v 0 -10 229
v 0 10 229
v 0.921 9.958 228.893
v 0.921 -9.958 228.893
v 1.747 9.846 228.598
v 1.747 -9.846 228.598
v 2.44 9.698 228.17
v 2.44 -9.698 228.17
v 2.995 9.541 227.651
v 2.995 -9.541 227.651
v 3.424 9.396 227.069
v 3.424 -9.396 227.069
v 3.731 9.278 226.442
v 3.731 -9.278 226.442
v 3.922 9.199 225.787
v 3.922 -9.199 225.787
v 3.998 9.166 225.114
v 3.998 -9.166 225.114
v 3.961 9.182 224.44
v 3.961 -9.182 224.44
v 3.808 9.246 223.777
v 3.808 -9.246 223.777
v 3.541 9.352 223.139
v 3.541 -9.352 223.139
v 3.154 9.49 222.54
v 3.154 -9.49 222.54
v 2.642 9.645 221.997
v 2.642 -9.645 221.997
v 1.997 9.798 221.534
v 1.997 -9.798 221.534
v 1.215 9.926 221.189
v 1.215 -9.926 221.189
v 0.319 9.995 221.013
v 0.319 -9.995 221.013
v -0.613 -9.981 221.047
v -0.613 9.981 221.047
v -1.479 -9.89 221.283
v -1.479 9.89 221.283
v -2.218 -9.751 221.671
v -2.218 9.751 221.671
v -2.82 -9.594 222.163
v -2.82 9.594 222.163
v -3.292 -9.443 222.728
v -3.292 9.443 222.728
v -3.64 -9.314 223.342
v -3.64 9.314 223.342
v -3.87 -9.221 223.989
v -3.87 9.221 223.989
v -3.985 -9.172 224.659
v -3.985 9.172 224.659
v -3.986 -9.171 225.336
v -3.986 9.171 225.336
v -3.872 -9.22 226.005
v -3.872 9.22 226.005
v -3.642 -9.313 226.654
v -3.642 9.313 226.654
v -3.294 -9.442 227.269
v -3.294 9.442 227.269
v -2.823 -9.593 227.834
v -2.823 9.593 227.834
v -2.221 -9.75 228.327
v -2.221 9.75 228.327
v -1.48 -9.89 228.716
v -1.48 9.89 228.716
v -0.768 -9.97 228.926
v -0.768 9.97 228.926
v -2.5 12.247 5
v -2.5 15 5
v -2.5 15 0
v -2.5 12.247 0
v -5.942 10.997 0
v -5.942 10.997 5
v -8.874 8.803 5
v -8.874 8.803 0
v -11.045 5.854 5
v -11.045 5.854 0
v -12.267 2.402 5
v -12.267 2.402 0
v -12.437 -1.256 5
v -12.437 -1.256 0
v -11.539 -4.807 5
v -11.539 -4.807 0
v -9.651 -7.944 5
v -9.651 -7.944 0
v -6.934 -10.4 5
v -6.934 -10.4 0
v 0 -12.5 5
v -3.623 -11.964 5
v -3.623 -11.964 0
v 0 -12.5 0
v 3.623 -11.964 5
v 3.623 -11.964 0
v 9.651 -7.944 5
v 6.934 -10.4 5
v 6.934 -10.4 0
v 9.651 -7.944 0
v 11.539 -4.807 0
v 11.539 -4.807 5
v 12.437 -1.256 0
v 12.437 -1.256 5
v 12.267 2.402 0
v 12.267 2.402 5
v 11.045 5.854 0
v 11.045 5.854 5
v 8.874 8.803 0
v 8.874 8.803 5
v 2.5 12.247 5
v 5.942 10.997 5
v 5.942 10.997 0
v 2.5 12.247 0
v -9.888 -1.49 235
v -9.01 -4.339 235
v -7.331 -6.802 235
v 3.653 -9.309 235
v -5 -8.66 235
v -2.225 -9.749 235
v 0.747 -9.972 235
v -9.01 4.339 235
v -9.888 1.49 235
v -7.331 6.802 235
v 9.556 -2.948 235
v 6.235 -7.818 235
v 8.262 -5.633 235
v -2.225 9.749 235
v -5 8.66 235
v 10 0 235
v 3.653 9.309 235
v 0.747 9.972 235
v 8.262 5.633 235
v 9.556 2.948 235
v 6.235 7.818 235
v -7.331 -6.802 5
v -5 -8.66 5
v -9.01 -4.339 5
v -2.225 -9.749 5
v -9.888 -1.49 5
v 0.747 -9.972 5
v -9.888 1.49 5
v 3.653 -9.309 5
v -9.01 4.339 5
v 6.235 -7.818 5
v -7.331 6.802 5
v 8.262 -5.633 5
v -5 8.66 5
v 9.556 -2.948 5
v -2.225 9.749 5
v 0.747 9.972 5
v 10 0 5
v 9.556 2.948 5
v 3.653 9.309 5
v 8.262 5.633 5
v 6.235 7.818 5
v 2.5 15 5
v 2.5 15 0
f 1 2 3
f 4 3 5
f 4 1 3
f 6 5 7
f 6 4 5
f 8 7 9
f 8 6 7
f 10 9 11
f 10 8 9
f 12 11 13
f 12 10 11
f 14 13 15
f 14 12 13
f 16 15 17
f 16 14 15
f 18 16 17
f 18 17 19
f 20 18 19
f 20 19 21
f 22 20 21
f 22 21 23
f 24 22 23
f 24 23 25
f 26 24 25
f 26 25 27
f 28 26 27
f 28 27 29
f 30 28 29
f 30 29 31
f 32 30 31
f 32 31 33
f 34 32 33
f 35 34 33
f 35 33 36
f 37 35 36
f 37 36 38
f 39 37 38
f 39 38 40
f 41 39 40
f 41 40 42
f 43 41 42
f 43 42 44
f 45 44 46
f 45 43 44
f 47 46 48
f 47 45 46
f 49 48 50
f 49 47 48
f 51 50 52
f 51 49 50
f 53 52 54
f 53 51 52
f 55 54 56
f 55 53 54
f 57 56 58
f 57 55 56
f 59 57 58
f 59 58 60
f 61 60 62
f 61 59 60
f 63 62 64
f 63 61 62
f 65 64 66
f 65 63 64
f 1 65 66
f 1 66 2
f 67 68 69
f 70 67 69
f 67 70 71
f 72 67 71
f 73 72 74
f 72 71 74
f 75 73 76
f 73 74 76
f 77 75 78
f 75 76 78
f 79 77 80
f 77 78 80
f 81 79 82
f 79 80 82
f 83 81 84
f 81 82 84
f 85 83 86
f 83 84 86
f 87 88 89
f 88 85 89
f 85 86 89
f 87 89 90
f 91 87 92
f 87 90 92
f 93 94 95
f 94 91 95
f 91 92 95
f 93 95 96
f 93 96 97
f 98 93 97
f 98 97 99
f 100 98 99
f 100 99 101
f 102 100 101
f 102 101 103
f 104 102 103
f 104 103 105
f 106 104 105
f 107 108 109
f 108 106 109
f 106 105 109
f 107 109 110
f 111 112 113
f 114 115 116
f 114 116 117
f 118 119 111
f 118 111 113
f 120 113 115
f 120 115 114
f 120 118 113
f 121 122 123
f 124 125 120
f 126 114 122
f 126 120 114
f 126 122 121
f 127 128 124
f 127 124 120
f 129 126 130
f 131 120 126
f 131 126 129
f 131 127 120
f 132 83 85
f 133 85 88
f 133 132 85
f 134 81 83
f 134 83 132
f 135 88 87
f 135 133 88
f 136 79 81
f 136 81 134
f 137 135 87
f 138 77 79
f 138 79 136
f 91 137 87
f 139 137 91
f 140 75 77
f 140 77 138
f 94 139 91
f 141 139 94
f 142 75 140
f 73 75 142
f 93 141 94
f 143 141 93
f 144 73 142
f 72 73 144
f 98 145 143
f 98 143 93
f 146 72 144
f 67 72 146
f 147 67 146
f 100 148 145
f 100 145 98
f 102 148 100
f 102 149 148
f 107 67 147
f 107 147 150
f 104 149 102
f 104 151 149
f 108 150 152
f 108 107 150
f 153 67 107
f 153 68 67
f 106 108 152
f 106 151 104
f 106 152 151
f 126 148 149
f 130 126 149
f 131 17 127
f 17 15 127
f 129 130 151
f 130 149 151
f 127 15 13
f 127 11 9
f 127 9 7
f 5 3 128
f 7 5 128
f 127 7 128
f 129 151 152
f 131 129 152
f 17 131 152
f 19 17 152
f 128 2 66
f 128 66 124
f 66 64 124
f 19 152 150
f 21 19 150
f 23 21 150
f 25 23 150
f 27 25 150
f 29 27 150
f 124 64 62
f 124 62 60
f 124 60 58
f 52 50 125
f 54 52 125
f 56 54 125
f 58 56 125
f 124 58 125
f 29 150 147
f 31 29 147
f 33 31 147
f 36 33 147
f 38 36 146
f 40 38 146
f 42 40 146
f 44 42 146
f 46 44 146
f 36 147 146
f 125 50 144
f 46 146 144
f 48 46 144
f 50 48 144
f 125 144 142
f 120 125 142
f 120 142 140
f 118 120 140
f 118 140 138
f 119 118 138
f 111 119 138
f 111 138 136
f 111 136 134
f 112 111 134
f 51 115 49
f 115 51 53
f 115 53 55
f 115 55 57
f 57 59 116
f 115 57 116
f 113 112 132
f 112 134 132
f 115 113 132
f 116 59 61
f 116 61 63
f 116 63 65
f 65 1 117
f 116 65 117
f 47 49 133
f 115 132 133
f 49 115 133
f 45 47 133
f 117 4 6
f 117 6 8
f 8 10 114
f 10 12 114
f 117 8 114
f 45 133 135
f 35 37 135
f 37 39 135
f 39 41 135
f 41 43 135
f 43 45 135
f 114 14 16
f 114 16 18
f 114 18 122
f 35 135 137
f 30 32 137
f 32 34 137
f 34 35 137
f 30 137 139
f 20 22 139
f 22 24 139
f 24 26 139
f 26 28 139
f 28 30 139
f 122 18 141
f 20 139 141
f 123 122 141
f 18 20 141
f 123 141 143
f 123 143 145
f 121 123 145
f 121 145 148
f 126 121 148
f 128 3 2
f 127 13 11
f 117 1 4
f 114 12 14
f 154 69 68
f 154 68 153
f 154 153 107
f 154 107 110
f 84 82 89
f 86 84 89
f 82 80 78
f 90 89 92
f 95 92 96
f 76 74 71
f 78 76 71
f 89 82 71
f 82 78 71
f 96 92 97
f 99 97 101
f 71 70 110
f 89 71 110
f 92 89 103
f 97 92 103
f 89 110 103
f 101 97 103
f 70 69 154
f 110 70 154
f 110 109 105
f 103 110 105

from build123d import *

# Parameters (mm, degrees)
SKETCH1_R                = 12.5
BOSS_EXTRUDE1_DEPTH      = 5
SKETCH3_R                = 10
BOSS_EXTRUDE2_DEPTH      = 230
CUT_EXTRUDE1_DEPTH       = 236.663955666
CUT_EXTRUDE1_DEPTH_BACK  = 236.663955666
SKETCH4_R                = 4
BOSS_EXTRUDE3_REACH      = 238.934
BOSS_EXTRUDE3_END_RADIUS = 12.5
SKETCH5_W                = 5
SKETCH5_H                = 5


with BuildPart() as part:
    # Sketch1 → Boss-Extrude1 (new body)
    with BuildSketch(Plane.XY):
        Circle(SKETCH1_R)
    extrude(amount=BOSS_EXTRUDE1_DEPTH)

    # Sketch3 → Boss-Extrude2 (add)
    with BuildSketch(Plane.XY.offset(5)):
        Circle(SKETCH3_R)
    extrude(amount=BOSS_EXTRUDE2_DEPTH)

    # Sketch4 → Cut-Extrude1 (cut, two sides: drawn at the far end of the back side and taken through both)
    with BuildSketch(Plane(origin=(0, 0, 0), x_dir=(1, 0, 0), z_dir=(0, 1, 0)).offset(-CUT_EXTRUDE1_DEPTH_BACK)):
        with Locations(Location((0, -225, 0), (0, 0, 270))):
            Circle(SKETCH4_R)
    extrude(amount=CUT_EXTRUDE1_DEPTH + CUT_EXTRUDE1_DEPTH_BACK, mode=Mode.SUBTRACT)

    # Boss-Extrude3: up to this cylinder (the profile starts outside it)
    boss_extrude3_end = Plane(origin=(0, 0, 2.5), z_dir=(0, 0, -1)) * Cylinder(BOSS_EXTRUDE3_END_RADIUS, 503.868, mode=Mode.PRIVATE)
    # Sketch5 → Boss-Extrude3 (add, up to the surface)
    with BuildSketch(Plane(origin=(0, 15, 0), x_dir=(1, 0, 0), z_dir=(0, 1, 0)), mode=Mode.PRIVATE) as boss_extrude3_sk1:
        with Locations((0, -2.5)):
            Rectangle(SKETCH5_W, SKETCH5_H)
    boss_extrude3_tool1 = extrude(boss_extrude3_sk1.sketch, amount=-BOSS_EXTRUDE3_REACH, mode=Mode.PRIVATE) - boss_extrude3_end
    add(boss_extrude3_tool1.solids().sort_by_distance((0, 15, 2.5))[0])


solid = part.part
